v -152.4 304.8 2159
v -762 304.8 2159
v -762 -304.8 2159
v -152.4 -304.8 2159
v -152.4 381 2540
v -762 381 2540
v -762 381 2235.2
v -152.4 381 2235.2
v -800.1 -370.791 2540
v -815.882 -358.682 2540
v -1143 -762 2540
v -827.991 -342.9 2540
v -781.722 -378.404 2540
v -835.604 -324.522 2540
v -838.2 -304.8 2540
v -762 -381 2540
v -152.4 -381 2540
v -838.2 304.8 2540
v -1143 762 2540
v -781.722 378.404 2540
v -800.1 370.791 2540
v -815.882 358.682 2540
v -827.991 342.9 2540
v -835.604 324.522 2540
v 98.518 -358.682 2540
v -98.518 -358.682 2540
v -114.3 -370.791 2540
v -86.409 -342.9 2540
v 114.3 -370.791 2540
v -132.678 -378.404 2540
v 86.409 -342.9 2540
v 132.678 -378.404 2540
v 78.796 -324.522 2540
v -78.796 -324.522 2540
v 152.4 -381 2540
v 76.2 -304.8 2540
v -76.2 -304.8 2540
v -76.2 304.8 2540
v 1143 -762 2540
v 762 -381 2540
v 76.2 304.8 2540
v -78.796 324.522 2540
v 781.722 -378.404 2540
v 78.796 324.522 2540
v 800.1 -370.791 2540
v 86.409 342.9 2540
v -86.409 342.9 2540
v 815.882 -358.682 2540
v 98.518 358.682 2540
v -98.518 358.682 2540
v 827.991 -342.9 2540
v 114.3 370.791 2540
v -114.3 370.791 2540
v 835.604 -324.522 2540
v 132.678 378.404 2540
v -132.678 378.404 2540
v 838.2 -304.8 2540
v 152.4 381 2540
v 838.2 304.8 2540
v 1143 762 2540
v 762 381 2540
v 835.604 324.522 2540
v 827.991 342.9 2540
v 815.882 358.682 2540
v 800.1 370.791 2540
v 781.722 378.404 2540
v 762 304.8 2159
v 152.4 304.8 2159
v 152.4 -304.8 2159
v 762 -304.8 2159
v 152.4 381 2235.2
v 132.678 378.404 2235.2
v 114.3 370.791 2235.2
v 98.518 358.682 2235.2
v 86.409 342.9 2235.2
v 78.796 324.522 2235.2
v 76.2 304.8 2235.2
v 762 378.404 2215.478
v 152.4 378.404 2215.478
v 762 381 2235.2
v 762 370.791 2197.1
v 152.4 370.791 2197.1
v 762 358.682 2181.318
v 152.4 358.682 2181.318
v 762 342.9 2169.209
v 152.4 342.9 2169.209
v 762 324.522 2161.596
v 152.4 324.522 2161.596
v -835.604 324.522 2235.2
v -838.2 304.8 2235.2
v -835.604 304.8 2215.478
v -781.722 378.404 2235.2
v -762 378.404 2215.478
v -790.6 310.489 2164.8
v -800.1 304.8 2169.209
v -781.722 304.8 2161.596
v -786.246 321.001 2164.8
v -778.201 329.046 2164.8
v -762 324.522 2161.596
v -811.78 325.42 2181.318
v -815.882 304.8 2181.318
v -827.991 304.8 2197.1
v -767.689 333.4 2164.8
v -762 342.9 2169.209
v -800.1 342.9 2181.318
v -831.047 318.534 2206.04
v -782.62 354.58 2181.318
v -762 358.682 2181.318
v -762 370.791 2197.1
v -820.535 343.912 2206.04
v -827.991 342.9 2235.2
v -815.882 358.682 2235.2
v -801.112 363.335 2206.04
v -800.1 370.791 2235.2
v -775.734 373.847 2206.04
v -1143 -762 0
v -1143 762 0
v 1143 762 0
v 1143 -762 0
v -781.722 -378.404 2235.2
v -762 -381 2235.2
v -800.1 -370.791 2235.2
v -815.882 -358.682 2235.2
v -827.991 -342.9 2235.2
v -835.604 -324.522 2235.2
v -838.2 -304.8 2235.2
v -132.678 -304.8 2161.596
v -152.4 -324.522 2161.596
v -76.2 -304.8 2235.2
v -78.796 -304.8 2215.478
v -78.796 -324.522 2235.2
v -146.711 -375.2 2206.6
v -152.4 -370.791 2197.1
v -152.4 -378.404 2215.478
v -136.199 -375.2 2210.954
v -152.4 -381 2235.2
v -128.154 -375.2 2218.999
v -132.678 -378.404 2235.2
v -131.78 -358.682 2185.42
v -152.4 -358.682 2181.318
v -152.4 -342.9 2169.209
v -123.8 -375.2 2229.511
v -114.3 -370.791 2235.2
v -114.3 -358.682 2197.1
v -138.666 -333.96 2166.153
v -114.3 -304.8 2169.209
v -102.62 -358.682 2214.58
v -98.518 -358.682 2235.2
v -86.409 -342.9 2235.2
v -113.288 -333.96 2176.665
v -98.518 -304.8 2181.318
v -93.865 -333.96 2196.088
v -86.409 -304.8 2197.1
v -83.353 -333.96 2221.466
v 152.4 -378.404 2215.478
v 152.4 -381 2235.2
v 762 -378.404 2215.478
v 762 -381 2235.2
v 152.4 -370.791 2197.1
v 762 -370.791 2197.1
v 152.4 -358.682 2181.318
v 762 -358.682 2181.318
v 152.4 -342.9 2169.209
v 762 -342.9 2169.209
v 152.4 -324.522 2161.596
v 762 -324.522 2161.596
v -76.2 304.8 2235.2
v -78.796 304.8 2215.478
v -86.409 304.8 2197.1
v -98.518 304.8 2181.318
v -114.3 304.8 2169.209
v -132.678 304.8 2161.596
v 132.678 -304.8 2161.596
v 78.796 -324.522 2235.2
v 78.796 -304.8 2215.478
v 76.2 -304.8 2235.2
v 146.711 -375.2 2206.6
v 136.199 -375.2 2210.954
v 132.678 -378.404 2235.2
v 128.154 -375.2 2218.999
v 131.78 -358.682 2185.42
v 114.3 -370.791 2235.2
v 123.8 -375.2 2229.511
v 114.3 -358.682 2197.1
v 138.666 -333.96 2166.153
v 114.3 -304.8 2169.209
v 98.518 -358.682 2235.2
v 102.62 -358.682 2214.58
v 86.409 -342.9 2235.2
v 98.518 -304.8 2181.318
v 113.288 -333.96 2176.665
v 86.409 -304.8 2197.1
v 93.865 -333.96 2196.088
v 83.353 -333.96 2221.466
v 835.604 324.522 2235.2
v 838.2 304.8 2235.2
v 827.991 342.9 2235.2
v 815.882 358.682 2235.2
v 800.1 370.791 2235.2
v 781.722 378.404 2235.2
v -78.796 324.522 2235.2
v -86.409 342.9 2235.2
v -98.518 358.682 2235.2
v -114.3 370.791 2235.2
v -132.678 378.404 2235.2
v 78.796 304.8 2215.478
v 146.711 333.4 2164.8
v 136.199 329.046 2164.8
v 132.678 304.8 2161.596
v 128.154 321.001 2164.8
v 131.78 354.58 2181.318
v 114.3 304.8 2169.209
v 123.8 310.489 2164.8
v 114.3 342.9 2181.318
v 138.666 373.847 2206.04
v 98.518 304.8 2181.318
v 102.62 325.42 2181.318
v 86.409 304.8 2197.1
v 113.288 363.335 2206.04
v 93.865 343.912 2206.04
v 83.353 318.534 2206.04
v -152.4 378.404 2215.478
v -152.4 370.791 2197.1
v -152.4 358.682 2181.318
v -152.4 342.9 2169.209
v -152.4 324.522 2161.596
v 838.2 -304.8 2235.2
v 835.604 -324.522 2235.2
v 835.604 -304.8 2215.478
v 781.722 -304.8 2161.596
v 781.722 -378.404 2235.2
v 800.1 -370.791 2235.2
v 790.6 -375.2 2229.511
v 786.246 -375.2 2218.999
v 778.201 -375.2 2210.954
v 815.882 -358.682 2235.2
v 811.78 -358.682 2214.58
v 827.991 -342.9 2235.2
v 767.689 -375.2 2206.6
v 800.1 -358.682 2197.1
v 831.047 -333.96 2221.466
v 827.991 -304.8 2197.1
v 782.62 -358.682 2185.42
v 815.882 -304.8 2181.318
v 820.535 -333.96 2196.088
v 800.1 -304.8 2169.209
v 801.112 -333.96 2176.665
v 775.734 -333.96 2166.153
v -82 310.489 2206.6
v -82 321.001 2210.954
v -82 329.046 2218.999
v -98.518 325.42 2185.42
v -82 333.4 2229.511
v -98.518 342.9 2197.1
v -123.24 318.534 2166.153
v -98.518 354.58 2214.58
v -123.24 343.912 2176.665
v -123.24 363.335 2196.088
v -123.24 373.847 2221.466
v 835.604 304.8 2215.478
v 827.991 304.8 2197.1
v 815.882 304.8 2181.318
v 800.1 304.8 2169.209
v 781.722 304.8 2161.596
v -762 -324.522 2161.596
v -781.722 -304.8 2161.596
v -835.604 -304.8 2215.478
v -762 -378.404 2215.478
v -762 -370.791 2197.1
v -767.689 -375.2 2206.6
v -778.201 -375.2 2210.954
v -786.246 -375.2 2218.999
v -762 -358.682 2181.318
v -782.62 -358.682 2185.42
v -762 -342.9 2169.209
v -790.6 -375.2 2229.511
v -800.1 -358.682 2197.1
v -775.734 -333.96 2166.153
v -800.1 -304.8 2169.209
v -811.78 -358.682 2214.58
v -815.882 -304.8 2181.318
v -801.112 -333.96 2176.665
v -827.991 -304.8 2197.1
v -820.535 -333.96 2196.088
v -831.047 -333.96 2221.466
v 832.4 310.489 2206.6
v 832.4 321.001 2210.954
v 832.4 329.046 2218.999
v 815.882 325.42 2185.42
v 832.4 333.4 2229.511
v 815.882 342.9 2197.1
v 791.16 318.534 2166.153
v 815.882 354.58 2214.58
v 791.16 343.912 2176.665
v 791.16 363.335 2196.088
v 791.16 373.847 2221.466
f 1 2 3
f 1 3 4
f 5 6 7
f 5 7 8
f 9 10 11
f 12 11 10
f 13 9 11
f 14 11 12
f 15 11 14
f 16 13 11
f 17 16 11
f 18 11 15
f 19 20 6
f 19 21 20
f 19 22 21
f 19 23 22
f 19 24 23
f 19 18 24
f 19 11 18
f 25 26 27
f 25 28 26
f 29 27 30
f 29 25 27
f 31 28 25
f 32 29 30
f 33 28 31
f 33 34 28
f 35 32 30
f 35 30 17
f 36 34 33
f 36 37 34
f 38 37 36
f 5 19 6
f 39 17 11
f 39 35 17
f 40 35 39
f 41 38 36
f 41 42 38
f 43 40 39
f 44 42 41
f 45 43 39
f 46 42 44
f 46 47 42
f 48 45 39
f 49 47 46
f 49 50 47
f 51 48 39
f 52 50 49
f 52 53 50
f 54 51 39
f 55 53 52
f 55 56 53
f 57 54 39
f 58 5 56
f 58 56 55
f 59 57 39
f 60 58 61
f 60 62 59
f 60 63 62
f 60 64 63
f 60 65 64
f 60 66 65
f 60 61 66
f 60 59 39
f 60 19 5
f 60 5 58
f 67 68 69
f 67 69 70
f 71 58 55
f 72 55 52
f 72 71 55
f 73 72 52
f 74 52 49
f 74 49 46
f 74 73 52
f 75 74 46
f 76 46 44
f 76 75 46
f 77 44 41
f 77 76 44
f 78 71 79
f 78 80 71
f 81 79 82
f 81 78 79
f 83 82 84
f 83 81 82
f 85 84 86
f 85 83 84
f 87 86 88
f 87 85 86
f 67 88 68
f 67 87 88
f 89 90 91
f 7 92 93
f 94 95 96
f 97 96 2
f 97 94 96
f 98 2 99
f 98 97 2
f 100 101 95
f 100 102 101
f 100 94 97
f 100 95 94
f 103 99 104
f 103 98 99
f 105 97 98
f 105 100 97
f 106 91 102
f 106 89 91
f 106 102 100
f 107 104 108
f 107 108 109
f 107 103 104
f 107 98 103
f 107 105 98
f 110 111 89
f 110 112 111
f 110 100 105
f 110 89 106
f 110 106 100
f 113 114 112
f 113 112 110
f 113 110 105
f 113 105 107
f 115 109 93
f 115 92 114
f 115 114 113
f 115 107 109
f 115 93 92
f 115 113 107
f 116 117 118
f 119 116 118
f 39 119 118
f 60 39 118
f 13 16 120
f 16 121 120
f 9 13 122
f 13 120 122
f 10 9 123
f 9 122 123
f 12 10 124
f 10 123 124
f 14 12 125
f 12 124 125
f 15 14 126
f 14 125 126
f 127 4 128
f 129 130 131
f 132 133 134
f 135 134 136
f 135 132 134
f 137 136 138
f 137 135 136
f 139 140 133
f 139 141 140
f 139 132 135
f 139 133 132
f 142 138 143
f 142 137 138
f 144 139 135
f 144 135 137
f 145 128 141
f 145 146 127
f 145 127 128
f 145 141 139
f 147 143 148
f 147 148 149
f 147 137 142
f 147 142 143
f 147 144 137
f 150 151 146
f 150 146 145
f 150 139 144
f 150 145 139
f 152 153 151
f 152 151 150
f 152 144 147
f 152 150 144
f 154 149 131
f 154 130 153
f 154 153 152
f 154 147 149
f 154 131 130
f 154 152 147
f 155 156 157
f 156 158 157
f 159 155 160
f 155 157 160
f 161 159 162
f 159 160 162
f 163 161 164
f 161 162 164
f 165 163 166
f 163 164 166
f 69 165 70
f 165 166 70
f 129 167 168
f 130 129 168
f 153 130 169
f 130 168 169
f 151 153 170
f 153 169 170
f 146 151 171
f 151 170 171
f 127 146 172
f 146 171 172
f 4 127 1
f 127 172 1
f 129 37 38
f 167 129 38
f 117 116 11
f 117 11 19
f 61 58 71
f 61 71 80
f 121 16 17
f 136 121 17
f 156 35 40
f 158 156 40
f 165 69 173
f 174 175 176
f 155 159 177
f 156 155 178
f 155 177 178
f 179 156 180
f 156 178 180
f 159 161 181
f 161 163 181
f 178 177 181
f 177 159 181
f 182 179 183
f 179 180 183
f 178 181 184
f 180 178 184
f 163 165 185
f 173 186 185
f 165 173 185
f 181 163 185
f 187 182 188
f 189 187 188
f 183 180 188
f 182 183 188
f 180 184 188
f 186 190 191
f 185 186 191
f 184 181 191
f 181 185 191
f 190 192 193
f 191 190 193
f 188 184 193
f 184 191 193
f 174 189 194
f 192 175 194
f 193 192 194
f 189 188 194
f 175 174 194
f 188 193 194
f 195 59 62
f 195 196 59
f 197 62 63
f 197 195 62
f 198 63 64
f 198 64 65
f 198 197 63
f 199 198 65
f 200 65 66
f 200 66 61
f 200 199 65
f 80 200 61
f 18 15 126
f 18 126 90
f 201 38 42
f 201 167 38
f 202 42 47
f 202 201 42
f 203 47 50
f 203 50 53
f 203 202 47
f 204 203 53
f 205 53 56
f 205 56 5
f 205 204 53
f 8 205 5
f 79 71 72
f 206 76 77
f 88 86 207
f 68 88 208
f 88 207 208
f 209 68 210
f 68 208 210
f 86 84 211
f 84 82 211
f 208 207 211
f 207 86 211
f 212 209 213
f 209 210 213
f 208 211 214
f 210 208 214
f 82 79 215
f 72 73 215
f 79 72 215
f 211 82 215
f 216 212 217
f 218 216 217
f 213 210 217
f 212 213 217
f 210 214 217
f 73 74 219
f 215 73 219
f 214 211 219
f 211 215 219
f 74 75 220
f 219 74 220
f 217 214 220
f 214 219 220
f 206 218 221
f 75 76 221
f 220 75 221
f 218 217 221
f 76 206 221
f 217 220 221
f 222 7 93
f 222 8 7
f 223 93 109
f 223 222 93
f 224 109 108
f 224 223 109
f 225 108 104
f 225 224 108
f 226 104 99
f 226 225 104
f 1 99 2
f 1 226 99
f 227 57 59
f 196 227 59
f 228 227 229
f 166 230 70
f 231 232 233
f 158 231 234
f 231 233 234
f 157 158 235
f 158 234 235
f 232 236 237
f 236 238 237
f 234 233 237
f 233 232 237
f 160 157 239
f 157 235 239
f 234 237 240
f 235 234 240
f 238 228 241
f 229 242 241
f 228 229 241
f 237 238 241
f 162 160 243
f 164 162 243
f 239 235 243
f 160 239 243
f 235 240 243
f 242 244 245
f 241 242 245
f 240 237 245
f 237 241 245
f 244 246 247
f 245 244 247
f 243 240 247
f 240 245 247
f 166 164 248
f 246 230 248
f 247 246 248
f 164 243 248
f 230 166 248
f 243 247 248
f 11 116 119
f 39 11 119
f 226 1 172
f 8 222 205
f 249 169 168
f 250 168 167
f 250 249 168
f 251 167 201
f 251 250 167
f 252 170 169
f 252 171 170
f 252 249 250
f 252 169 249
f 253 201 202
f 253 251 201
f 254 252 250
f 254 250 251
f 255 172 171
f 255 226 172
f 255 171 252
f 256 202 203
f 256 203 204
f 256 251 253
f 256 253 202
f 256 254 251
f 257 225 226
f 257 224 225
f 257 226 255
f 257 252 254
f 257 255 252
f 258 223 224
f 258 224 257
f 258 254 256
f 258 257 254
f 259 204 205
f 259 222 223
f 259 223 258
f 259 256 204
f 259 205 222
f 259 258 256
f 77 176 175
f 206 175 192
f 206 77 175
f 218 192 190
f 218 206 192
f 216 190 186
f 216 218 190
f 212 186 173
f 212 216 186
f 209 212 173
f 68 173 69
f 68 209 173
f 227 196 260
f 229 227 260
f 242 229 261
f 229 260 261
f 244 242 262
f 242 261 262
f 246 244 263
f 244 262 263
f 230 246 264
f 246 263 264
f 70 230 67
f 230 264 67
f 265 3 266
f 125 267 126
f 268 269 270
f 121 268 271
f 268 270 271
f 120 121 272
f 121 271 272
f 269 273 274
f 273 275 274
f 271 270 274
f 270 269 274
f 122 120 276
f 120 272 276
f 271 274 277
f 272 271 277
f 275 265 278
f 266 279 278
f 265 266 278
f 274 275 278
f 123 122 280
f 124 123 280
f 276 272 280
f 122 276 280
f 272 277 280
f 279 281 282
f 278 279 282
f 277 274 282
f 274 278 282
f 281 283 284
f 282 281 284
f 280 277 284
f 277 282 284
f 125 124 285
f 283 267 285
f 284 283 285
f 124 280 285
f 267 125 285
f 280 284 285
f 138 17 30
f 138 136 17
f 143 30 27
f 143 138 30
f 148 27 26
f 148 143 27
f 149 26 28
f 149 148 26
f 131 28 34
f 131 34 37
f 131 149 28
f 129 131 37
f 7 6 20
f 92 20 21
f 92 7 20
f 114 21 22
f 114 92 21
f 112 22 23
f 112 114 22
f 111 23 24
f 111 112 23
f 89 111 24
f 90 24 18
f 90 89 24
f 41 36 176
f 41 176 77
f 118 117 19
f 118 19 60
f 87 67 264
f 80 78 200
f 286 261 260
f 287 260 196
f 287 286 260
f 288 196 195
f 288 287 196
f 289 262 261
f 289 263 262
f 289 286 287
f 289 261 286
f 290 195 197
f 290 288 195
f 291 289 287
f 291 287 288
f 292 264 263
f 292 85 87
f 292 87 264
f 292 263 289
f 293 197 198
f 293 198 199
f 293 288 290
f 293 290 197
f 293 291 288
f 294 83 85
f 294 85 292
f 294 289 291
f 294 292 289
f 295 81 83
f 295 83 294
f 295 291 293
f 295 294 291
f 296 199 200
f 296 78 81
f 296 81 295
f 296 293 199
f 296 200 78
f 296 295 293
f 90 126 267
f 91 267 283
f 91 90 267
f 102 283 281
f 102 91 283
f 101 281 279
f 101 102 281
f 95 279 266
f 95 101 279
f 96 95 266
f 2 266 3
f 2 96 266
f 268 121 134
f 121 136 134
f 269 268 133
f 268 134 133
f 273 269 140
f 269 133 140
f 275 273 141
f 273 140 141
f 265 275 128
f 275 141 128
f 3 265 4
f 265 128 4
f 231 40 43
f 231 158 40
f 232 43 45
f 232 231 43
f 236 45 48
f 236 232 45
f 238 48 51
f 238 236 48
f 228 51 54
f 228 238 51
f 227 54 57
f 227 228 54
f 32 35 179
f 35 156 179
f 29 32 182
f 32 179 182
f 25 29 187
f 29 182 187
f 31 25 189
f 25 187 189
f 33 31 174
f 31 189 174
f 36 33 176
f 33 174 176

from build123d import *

# Parameters (mm, degrees)
F0_W     = 2286
F0_H     = 1524
F1_DEPTH = 2540
F2_W     = 762
F2_H     = 762
F3_DEPTH = 381
F4_R     = 76.2
F5_W     = 762
F5_H     = 762
F6_DEPTH = 381
F7_R     = 76.2


with BuildPart() as f1:
    # F0 (on Top) → F1 (new body)
    with BuildSketch(Plane.XY):
        Rectangle(F0_W, F0_H)
    extrude(amount=F1_DEPTH)

    # F2 (on face) → F3 (cut)
    with BuildSketch(Plane.XY.offset(2540)):
        with Locations((-457.2, 0)):
            Rectangle(F2_W, F2_H)
    extrude(amount=-F3_DEPTH, mode=Mode.SUBTRACT)

    # F4
    f4_edges = [f1.edges().sort_by_distance(p)[0] for p in [
        (-838.2, 381, 2349.5),
        (-838.2, 0, 2159),
        (-457.2, 381, 2159),
        (-76.2, 0, 2159),
        (-76.2, 381, 2349.5),
        (-457.2, -381, 2159),
        (-76.2, -381, 2349.5),
        (-838.2, -381, 2349.5),
    ]]
    fillet(f4_edges, radius=F4_R)

    # F5 (on face) → F6 (cut)
    with BuildSketch(Plane.XY.offset(2540)):
        with Locations((457.2, 0)):
            Rectangle(F5_W, F5_H)
    extrude(amount=-F6_DEPTH, mode=Mode.SUBTRACT)

    # F7
    f7_edges = [f1.edges().sort_by_distance(p)[0] for p in [
        (76.2, 381, 2349.5),
        (457.2, 381, 2159),
        (76.2, 0, 2159),
        (838.2, 0, 2159),
        (838.2, 381, 2349.5),
        (838.2, -381, 2349.5),
        (457.2, -381, 2159),
        (76.2, -381, 2349.5),
    ]]
    fillet(f7_edges, radius=F7_R)


solid = f1.part
